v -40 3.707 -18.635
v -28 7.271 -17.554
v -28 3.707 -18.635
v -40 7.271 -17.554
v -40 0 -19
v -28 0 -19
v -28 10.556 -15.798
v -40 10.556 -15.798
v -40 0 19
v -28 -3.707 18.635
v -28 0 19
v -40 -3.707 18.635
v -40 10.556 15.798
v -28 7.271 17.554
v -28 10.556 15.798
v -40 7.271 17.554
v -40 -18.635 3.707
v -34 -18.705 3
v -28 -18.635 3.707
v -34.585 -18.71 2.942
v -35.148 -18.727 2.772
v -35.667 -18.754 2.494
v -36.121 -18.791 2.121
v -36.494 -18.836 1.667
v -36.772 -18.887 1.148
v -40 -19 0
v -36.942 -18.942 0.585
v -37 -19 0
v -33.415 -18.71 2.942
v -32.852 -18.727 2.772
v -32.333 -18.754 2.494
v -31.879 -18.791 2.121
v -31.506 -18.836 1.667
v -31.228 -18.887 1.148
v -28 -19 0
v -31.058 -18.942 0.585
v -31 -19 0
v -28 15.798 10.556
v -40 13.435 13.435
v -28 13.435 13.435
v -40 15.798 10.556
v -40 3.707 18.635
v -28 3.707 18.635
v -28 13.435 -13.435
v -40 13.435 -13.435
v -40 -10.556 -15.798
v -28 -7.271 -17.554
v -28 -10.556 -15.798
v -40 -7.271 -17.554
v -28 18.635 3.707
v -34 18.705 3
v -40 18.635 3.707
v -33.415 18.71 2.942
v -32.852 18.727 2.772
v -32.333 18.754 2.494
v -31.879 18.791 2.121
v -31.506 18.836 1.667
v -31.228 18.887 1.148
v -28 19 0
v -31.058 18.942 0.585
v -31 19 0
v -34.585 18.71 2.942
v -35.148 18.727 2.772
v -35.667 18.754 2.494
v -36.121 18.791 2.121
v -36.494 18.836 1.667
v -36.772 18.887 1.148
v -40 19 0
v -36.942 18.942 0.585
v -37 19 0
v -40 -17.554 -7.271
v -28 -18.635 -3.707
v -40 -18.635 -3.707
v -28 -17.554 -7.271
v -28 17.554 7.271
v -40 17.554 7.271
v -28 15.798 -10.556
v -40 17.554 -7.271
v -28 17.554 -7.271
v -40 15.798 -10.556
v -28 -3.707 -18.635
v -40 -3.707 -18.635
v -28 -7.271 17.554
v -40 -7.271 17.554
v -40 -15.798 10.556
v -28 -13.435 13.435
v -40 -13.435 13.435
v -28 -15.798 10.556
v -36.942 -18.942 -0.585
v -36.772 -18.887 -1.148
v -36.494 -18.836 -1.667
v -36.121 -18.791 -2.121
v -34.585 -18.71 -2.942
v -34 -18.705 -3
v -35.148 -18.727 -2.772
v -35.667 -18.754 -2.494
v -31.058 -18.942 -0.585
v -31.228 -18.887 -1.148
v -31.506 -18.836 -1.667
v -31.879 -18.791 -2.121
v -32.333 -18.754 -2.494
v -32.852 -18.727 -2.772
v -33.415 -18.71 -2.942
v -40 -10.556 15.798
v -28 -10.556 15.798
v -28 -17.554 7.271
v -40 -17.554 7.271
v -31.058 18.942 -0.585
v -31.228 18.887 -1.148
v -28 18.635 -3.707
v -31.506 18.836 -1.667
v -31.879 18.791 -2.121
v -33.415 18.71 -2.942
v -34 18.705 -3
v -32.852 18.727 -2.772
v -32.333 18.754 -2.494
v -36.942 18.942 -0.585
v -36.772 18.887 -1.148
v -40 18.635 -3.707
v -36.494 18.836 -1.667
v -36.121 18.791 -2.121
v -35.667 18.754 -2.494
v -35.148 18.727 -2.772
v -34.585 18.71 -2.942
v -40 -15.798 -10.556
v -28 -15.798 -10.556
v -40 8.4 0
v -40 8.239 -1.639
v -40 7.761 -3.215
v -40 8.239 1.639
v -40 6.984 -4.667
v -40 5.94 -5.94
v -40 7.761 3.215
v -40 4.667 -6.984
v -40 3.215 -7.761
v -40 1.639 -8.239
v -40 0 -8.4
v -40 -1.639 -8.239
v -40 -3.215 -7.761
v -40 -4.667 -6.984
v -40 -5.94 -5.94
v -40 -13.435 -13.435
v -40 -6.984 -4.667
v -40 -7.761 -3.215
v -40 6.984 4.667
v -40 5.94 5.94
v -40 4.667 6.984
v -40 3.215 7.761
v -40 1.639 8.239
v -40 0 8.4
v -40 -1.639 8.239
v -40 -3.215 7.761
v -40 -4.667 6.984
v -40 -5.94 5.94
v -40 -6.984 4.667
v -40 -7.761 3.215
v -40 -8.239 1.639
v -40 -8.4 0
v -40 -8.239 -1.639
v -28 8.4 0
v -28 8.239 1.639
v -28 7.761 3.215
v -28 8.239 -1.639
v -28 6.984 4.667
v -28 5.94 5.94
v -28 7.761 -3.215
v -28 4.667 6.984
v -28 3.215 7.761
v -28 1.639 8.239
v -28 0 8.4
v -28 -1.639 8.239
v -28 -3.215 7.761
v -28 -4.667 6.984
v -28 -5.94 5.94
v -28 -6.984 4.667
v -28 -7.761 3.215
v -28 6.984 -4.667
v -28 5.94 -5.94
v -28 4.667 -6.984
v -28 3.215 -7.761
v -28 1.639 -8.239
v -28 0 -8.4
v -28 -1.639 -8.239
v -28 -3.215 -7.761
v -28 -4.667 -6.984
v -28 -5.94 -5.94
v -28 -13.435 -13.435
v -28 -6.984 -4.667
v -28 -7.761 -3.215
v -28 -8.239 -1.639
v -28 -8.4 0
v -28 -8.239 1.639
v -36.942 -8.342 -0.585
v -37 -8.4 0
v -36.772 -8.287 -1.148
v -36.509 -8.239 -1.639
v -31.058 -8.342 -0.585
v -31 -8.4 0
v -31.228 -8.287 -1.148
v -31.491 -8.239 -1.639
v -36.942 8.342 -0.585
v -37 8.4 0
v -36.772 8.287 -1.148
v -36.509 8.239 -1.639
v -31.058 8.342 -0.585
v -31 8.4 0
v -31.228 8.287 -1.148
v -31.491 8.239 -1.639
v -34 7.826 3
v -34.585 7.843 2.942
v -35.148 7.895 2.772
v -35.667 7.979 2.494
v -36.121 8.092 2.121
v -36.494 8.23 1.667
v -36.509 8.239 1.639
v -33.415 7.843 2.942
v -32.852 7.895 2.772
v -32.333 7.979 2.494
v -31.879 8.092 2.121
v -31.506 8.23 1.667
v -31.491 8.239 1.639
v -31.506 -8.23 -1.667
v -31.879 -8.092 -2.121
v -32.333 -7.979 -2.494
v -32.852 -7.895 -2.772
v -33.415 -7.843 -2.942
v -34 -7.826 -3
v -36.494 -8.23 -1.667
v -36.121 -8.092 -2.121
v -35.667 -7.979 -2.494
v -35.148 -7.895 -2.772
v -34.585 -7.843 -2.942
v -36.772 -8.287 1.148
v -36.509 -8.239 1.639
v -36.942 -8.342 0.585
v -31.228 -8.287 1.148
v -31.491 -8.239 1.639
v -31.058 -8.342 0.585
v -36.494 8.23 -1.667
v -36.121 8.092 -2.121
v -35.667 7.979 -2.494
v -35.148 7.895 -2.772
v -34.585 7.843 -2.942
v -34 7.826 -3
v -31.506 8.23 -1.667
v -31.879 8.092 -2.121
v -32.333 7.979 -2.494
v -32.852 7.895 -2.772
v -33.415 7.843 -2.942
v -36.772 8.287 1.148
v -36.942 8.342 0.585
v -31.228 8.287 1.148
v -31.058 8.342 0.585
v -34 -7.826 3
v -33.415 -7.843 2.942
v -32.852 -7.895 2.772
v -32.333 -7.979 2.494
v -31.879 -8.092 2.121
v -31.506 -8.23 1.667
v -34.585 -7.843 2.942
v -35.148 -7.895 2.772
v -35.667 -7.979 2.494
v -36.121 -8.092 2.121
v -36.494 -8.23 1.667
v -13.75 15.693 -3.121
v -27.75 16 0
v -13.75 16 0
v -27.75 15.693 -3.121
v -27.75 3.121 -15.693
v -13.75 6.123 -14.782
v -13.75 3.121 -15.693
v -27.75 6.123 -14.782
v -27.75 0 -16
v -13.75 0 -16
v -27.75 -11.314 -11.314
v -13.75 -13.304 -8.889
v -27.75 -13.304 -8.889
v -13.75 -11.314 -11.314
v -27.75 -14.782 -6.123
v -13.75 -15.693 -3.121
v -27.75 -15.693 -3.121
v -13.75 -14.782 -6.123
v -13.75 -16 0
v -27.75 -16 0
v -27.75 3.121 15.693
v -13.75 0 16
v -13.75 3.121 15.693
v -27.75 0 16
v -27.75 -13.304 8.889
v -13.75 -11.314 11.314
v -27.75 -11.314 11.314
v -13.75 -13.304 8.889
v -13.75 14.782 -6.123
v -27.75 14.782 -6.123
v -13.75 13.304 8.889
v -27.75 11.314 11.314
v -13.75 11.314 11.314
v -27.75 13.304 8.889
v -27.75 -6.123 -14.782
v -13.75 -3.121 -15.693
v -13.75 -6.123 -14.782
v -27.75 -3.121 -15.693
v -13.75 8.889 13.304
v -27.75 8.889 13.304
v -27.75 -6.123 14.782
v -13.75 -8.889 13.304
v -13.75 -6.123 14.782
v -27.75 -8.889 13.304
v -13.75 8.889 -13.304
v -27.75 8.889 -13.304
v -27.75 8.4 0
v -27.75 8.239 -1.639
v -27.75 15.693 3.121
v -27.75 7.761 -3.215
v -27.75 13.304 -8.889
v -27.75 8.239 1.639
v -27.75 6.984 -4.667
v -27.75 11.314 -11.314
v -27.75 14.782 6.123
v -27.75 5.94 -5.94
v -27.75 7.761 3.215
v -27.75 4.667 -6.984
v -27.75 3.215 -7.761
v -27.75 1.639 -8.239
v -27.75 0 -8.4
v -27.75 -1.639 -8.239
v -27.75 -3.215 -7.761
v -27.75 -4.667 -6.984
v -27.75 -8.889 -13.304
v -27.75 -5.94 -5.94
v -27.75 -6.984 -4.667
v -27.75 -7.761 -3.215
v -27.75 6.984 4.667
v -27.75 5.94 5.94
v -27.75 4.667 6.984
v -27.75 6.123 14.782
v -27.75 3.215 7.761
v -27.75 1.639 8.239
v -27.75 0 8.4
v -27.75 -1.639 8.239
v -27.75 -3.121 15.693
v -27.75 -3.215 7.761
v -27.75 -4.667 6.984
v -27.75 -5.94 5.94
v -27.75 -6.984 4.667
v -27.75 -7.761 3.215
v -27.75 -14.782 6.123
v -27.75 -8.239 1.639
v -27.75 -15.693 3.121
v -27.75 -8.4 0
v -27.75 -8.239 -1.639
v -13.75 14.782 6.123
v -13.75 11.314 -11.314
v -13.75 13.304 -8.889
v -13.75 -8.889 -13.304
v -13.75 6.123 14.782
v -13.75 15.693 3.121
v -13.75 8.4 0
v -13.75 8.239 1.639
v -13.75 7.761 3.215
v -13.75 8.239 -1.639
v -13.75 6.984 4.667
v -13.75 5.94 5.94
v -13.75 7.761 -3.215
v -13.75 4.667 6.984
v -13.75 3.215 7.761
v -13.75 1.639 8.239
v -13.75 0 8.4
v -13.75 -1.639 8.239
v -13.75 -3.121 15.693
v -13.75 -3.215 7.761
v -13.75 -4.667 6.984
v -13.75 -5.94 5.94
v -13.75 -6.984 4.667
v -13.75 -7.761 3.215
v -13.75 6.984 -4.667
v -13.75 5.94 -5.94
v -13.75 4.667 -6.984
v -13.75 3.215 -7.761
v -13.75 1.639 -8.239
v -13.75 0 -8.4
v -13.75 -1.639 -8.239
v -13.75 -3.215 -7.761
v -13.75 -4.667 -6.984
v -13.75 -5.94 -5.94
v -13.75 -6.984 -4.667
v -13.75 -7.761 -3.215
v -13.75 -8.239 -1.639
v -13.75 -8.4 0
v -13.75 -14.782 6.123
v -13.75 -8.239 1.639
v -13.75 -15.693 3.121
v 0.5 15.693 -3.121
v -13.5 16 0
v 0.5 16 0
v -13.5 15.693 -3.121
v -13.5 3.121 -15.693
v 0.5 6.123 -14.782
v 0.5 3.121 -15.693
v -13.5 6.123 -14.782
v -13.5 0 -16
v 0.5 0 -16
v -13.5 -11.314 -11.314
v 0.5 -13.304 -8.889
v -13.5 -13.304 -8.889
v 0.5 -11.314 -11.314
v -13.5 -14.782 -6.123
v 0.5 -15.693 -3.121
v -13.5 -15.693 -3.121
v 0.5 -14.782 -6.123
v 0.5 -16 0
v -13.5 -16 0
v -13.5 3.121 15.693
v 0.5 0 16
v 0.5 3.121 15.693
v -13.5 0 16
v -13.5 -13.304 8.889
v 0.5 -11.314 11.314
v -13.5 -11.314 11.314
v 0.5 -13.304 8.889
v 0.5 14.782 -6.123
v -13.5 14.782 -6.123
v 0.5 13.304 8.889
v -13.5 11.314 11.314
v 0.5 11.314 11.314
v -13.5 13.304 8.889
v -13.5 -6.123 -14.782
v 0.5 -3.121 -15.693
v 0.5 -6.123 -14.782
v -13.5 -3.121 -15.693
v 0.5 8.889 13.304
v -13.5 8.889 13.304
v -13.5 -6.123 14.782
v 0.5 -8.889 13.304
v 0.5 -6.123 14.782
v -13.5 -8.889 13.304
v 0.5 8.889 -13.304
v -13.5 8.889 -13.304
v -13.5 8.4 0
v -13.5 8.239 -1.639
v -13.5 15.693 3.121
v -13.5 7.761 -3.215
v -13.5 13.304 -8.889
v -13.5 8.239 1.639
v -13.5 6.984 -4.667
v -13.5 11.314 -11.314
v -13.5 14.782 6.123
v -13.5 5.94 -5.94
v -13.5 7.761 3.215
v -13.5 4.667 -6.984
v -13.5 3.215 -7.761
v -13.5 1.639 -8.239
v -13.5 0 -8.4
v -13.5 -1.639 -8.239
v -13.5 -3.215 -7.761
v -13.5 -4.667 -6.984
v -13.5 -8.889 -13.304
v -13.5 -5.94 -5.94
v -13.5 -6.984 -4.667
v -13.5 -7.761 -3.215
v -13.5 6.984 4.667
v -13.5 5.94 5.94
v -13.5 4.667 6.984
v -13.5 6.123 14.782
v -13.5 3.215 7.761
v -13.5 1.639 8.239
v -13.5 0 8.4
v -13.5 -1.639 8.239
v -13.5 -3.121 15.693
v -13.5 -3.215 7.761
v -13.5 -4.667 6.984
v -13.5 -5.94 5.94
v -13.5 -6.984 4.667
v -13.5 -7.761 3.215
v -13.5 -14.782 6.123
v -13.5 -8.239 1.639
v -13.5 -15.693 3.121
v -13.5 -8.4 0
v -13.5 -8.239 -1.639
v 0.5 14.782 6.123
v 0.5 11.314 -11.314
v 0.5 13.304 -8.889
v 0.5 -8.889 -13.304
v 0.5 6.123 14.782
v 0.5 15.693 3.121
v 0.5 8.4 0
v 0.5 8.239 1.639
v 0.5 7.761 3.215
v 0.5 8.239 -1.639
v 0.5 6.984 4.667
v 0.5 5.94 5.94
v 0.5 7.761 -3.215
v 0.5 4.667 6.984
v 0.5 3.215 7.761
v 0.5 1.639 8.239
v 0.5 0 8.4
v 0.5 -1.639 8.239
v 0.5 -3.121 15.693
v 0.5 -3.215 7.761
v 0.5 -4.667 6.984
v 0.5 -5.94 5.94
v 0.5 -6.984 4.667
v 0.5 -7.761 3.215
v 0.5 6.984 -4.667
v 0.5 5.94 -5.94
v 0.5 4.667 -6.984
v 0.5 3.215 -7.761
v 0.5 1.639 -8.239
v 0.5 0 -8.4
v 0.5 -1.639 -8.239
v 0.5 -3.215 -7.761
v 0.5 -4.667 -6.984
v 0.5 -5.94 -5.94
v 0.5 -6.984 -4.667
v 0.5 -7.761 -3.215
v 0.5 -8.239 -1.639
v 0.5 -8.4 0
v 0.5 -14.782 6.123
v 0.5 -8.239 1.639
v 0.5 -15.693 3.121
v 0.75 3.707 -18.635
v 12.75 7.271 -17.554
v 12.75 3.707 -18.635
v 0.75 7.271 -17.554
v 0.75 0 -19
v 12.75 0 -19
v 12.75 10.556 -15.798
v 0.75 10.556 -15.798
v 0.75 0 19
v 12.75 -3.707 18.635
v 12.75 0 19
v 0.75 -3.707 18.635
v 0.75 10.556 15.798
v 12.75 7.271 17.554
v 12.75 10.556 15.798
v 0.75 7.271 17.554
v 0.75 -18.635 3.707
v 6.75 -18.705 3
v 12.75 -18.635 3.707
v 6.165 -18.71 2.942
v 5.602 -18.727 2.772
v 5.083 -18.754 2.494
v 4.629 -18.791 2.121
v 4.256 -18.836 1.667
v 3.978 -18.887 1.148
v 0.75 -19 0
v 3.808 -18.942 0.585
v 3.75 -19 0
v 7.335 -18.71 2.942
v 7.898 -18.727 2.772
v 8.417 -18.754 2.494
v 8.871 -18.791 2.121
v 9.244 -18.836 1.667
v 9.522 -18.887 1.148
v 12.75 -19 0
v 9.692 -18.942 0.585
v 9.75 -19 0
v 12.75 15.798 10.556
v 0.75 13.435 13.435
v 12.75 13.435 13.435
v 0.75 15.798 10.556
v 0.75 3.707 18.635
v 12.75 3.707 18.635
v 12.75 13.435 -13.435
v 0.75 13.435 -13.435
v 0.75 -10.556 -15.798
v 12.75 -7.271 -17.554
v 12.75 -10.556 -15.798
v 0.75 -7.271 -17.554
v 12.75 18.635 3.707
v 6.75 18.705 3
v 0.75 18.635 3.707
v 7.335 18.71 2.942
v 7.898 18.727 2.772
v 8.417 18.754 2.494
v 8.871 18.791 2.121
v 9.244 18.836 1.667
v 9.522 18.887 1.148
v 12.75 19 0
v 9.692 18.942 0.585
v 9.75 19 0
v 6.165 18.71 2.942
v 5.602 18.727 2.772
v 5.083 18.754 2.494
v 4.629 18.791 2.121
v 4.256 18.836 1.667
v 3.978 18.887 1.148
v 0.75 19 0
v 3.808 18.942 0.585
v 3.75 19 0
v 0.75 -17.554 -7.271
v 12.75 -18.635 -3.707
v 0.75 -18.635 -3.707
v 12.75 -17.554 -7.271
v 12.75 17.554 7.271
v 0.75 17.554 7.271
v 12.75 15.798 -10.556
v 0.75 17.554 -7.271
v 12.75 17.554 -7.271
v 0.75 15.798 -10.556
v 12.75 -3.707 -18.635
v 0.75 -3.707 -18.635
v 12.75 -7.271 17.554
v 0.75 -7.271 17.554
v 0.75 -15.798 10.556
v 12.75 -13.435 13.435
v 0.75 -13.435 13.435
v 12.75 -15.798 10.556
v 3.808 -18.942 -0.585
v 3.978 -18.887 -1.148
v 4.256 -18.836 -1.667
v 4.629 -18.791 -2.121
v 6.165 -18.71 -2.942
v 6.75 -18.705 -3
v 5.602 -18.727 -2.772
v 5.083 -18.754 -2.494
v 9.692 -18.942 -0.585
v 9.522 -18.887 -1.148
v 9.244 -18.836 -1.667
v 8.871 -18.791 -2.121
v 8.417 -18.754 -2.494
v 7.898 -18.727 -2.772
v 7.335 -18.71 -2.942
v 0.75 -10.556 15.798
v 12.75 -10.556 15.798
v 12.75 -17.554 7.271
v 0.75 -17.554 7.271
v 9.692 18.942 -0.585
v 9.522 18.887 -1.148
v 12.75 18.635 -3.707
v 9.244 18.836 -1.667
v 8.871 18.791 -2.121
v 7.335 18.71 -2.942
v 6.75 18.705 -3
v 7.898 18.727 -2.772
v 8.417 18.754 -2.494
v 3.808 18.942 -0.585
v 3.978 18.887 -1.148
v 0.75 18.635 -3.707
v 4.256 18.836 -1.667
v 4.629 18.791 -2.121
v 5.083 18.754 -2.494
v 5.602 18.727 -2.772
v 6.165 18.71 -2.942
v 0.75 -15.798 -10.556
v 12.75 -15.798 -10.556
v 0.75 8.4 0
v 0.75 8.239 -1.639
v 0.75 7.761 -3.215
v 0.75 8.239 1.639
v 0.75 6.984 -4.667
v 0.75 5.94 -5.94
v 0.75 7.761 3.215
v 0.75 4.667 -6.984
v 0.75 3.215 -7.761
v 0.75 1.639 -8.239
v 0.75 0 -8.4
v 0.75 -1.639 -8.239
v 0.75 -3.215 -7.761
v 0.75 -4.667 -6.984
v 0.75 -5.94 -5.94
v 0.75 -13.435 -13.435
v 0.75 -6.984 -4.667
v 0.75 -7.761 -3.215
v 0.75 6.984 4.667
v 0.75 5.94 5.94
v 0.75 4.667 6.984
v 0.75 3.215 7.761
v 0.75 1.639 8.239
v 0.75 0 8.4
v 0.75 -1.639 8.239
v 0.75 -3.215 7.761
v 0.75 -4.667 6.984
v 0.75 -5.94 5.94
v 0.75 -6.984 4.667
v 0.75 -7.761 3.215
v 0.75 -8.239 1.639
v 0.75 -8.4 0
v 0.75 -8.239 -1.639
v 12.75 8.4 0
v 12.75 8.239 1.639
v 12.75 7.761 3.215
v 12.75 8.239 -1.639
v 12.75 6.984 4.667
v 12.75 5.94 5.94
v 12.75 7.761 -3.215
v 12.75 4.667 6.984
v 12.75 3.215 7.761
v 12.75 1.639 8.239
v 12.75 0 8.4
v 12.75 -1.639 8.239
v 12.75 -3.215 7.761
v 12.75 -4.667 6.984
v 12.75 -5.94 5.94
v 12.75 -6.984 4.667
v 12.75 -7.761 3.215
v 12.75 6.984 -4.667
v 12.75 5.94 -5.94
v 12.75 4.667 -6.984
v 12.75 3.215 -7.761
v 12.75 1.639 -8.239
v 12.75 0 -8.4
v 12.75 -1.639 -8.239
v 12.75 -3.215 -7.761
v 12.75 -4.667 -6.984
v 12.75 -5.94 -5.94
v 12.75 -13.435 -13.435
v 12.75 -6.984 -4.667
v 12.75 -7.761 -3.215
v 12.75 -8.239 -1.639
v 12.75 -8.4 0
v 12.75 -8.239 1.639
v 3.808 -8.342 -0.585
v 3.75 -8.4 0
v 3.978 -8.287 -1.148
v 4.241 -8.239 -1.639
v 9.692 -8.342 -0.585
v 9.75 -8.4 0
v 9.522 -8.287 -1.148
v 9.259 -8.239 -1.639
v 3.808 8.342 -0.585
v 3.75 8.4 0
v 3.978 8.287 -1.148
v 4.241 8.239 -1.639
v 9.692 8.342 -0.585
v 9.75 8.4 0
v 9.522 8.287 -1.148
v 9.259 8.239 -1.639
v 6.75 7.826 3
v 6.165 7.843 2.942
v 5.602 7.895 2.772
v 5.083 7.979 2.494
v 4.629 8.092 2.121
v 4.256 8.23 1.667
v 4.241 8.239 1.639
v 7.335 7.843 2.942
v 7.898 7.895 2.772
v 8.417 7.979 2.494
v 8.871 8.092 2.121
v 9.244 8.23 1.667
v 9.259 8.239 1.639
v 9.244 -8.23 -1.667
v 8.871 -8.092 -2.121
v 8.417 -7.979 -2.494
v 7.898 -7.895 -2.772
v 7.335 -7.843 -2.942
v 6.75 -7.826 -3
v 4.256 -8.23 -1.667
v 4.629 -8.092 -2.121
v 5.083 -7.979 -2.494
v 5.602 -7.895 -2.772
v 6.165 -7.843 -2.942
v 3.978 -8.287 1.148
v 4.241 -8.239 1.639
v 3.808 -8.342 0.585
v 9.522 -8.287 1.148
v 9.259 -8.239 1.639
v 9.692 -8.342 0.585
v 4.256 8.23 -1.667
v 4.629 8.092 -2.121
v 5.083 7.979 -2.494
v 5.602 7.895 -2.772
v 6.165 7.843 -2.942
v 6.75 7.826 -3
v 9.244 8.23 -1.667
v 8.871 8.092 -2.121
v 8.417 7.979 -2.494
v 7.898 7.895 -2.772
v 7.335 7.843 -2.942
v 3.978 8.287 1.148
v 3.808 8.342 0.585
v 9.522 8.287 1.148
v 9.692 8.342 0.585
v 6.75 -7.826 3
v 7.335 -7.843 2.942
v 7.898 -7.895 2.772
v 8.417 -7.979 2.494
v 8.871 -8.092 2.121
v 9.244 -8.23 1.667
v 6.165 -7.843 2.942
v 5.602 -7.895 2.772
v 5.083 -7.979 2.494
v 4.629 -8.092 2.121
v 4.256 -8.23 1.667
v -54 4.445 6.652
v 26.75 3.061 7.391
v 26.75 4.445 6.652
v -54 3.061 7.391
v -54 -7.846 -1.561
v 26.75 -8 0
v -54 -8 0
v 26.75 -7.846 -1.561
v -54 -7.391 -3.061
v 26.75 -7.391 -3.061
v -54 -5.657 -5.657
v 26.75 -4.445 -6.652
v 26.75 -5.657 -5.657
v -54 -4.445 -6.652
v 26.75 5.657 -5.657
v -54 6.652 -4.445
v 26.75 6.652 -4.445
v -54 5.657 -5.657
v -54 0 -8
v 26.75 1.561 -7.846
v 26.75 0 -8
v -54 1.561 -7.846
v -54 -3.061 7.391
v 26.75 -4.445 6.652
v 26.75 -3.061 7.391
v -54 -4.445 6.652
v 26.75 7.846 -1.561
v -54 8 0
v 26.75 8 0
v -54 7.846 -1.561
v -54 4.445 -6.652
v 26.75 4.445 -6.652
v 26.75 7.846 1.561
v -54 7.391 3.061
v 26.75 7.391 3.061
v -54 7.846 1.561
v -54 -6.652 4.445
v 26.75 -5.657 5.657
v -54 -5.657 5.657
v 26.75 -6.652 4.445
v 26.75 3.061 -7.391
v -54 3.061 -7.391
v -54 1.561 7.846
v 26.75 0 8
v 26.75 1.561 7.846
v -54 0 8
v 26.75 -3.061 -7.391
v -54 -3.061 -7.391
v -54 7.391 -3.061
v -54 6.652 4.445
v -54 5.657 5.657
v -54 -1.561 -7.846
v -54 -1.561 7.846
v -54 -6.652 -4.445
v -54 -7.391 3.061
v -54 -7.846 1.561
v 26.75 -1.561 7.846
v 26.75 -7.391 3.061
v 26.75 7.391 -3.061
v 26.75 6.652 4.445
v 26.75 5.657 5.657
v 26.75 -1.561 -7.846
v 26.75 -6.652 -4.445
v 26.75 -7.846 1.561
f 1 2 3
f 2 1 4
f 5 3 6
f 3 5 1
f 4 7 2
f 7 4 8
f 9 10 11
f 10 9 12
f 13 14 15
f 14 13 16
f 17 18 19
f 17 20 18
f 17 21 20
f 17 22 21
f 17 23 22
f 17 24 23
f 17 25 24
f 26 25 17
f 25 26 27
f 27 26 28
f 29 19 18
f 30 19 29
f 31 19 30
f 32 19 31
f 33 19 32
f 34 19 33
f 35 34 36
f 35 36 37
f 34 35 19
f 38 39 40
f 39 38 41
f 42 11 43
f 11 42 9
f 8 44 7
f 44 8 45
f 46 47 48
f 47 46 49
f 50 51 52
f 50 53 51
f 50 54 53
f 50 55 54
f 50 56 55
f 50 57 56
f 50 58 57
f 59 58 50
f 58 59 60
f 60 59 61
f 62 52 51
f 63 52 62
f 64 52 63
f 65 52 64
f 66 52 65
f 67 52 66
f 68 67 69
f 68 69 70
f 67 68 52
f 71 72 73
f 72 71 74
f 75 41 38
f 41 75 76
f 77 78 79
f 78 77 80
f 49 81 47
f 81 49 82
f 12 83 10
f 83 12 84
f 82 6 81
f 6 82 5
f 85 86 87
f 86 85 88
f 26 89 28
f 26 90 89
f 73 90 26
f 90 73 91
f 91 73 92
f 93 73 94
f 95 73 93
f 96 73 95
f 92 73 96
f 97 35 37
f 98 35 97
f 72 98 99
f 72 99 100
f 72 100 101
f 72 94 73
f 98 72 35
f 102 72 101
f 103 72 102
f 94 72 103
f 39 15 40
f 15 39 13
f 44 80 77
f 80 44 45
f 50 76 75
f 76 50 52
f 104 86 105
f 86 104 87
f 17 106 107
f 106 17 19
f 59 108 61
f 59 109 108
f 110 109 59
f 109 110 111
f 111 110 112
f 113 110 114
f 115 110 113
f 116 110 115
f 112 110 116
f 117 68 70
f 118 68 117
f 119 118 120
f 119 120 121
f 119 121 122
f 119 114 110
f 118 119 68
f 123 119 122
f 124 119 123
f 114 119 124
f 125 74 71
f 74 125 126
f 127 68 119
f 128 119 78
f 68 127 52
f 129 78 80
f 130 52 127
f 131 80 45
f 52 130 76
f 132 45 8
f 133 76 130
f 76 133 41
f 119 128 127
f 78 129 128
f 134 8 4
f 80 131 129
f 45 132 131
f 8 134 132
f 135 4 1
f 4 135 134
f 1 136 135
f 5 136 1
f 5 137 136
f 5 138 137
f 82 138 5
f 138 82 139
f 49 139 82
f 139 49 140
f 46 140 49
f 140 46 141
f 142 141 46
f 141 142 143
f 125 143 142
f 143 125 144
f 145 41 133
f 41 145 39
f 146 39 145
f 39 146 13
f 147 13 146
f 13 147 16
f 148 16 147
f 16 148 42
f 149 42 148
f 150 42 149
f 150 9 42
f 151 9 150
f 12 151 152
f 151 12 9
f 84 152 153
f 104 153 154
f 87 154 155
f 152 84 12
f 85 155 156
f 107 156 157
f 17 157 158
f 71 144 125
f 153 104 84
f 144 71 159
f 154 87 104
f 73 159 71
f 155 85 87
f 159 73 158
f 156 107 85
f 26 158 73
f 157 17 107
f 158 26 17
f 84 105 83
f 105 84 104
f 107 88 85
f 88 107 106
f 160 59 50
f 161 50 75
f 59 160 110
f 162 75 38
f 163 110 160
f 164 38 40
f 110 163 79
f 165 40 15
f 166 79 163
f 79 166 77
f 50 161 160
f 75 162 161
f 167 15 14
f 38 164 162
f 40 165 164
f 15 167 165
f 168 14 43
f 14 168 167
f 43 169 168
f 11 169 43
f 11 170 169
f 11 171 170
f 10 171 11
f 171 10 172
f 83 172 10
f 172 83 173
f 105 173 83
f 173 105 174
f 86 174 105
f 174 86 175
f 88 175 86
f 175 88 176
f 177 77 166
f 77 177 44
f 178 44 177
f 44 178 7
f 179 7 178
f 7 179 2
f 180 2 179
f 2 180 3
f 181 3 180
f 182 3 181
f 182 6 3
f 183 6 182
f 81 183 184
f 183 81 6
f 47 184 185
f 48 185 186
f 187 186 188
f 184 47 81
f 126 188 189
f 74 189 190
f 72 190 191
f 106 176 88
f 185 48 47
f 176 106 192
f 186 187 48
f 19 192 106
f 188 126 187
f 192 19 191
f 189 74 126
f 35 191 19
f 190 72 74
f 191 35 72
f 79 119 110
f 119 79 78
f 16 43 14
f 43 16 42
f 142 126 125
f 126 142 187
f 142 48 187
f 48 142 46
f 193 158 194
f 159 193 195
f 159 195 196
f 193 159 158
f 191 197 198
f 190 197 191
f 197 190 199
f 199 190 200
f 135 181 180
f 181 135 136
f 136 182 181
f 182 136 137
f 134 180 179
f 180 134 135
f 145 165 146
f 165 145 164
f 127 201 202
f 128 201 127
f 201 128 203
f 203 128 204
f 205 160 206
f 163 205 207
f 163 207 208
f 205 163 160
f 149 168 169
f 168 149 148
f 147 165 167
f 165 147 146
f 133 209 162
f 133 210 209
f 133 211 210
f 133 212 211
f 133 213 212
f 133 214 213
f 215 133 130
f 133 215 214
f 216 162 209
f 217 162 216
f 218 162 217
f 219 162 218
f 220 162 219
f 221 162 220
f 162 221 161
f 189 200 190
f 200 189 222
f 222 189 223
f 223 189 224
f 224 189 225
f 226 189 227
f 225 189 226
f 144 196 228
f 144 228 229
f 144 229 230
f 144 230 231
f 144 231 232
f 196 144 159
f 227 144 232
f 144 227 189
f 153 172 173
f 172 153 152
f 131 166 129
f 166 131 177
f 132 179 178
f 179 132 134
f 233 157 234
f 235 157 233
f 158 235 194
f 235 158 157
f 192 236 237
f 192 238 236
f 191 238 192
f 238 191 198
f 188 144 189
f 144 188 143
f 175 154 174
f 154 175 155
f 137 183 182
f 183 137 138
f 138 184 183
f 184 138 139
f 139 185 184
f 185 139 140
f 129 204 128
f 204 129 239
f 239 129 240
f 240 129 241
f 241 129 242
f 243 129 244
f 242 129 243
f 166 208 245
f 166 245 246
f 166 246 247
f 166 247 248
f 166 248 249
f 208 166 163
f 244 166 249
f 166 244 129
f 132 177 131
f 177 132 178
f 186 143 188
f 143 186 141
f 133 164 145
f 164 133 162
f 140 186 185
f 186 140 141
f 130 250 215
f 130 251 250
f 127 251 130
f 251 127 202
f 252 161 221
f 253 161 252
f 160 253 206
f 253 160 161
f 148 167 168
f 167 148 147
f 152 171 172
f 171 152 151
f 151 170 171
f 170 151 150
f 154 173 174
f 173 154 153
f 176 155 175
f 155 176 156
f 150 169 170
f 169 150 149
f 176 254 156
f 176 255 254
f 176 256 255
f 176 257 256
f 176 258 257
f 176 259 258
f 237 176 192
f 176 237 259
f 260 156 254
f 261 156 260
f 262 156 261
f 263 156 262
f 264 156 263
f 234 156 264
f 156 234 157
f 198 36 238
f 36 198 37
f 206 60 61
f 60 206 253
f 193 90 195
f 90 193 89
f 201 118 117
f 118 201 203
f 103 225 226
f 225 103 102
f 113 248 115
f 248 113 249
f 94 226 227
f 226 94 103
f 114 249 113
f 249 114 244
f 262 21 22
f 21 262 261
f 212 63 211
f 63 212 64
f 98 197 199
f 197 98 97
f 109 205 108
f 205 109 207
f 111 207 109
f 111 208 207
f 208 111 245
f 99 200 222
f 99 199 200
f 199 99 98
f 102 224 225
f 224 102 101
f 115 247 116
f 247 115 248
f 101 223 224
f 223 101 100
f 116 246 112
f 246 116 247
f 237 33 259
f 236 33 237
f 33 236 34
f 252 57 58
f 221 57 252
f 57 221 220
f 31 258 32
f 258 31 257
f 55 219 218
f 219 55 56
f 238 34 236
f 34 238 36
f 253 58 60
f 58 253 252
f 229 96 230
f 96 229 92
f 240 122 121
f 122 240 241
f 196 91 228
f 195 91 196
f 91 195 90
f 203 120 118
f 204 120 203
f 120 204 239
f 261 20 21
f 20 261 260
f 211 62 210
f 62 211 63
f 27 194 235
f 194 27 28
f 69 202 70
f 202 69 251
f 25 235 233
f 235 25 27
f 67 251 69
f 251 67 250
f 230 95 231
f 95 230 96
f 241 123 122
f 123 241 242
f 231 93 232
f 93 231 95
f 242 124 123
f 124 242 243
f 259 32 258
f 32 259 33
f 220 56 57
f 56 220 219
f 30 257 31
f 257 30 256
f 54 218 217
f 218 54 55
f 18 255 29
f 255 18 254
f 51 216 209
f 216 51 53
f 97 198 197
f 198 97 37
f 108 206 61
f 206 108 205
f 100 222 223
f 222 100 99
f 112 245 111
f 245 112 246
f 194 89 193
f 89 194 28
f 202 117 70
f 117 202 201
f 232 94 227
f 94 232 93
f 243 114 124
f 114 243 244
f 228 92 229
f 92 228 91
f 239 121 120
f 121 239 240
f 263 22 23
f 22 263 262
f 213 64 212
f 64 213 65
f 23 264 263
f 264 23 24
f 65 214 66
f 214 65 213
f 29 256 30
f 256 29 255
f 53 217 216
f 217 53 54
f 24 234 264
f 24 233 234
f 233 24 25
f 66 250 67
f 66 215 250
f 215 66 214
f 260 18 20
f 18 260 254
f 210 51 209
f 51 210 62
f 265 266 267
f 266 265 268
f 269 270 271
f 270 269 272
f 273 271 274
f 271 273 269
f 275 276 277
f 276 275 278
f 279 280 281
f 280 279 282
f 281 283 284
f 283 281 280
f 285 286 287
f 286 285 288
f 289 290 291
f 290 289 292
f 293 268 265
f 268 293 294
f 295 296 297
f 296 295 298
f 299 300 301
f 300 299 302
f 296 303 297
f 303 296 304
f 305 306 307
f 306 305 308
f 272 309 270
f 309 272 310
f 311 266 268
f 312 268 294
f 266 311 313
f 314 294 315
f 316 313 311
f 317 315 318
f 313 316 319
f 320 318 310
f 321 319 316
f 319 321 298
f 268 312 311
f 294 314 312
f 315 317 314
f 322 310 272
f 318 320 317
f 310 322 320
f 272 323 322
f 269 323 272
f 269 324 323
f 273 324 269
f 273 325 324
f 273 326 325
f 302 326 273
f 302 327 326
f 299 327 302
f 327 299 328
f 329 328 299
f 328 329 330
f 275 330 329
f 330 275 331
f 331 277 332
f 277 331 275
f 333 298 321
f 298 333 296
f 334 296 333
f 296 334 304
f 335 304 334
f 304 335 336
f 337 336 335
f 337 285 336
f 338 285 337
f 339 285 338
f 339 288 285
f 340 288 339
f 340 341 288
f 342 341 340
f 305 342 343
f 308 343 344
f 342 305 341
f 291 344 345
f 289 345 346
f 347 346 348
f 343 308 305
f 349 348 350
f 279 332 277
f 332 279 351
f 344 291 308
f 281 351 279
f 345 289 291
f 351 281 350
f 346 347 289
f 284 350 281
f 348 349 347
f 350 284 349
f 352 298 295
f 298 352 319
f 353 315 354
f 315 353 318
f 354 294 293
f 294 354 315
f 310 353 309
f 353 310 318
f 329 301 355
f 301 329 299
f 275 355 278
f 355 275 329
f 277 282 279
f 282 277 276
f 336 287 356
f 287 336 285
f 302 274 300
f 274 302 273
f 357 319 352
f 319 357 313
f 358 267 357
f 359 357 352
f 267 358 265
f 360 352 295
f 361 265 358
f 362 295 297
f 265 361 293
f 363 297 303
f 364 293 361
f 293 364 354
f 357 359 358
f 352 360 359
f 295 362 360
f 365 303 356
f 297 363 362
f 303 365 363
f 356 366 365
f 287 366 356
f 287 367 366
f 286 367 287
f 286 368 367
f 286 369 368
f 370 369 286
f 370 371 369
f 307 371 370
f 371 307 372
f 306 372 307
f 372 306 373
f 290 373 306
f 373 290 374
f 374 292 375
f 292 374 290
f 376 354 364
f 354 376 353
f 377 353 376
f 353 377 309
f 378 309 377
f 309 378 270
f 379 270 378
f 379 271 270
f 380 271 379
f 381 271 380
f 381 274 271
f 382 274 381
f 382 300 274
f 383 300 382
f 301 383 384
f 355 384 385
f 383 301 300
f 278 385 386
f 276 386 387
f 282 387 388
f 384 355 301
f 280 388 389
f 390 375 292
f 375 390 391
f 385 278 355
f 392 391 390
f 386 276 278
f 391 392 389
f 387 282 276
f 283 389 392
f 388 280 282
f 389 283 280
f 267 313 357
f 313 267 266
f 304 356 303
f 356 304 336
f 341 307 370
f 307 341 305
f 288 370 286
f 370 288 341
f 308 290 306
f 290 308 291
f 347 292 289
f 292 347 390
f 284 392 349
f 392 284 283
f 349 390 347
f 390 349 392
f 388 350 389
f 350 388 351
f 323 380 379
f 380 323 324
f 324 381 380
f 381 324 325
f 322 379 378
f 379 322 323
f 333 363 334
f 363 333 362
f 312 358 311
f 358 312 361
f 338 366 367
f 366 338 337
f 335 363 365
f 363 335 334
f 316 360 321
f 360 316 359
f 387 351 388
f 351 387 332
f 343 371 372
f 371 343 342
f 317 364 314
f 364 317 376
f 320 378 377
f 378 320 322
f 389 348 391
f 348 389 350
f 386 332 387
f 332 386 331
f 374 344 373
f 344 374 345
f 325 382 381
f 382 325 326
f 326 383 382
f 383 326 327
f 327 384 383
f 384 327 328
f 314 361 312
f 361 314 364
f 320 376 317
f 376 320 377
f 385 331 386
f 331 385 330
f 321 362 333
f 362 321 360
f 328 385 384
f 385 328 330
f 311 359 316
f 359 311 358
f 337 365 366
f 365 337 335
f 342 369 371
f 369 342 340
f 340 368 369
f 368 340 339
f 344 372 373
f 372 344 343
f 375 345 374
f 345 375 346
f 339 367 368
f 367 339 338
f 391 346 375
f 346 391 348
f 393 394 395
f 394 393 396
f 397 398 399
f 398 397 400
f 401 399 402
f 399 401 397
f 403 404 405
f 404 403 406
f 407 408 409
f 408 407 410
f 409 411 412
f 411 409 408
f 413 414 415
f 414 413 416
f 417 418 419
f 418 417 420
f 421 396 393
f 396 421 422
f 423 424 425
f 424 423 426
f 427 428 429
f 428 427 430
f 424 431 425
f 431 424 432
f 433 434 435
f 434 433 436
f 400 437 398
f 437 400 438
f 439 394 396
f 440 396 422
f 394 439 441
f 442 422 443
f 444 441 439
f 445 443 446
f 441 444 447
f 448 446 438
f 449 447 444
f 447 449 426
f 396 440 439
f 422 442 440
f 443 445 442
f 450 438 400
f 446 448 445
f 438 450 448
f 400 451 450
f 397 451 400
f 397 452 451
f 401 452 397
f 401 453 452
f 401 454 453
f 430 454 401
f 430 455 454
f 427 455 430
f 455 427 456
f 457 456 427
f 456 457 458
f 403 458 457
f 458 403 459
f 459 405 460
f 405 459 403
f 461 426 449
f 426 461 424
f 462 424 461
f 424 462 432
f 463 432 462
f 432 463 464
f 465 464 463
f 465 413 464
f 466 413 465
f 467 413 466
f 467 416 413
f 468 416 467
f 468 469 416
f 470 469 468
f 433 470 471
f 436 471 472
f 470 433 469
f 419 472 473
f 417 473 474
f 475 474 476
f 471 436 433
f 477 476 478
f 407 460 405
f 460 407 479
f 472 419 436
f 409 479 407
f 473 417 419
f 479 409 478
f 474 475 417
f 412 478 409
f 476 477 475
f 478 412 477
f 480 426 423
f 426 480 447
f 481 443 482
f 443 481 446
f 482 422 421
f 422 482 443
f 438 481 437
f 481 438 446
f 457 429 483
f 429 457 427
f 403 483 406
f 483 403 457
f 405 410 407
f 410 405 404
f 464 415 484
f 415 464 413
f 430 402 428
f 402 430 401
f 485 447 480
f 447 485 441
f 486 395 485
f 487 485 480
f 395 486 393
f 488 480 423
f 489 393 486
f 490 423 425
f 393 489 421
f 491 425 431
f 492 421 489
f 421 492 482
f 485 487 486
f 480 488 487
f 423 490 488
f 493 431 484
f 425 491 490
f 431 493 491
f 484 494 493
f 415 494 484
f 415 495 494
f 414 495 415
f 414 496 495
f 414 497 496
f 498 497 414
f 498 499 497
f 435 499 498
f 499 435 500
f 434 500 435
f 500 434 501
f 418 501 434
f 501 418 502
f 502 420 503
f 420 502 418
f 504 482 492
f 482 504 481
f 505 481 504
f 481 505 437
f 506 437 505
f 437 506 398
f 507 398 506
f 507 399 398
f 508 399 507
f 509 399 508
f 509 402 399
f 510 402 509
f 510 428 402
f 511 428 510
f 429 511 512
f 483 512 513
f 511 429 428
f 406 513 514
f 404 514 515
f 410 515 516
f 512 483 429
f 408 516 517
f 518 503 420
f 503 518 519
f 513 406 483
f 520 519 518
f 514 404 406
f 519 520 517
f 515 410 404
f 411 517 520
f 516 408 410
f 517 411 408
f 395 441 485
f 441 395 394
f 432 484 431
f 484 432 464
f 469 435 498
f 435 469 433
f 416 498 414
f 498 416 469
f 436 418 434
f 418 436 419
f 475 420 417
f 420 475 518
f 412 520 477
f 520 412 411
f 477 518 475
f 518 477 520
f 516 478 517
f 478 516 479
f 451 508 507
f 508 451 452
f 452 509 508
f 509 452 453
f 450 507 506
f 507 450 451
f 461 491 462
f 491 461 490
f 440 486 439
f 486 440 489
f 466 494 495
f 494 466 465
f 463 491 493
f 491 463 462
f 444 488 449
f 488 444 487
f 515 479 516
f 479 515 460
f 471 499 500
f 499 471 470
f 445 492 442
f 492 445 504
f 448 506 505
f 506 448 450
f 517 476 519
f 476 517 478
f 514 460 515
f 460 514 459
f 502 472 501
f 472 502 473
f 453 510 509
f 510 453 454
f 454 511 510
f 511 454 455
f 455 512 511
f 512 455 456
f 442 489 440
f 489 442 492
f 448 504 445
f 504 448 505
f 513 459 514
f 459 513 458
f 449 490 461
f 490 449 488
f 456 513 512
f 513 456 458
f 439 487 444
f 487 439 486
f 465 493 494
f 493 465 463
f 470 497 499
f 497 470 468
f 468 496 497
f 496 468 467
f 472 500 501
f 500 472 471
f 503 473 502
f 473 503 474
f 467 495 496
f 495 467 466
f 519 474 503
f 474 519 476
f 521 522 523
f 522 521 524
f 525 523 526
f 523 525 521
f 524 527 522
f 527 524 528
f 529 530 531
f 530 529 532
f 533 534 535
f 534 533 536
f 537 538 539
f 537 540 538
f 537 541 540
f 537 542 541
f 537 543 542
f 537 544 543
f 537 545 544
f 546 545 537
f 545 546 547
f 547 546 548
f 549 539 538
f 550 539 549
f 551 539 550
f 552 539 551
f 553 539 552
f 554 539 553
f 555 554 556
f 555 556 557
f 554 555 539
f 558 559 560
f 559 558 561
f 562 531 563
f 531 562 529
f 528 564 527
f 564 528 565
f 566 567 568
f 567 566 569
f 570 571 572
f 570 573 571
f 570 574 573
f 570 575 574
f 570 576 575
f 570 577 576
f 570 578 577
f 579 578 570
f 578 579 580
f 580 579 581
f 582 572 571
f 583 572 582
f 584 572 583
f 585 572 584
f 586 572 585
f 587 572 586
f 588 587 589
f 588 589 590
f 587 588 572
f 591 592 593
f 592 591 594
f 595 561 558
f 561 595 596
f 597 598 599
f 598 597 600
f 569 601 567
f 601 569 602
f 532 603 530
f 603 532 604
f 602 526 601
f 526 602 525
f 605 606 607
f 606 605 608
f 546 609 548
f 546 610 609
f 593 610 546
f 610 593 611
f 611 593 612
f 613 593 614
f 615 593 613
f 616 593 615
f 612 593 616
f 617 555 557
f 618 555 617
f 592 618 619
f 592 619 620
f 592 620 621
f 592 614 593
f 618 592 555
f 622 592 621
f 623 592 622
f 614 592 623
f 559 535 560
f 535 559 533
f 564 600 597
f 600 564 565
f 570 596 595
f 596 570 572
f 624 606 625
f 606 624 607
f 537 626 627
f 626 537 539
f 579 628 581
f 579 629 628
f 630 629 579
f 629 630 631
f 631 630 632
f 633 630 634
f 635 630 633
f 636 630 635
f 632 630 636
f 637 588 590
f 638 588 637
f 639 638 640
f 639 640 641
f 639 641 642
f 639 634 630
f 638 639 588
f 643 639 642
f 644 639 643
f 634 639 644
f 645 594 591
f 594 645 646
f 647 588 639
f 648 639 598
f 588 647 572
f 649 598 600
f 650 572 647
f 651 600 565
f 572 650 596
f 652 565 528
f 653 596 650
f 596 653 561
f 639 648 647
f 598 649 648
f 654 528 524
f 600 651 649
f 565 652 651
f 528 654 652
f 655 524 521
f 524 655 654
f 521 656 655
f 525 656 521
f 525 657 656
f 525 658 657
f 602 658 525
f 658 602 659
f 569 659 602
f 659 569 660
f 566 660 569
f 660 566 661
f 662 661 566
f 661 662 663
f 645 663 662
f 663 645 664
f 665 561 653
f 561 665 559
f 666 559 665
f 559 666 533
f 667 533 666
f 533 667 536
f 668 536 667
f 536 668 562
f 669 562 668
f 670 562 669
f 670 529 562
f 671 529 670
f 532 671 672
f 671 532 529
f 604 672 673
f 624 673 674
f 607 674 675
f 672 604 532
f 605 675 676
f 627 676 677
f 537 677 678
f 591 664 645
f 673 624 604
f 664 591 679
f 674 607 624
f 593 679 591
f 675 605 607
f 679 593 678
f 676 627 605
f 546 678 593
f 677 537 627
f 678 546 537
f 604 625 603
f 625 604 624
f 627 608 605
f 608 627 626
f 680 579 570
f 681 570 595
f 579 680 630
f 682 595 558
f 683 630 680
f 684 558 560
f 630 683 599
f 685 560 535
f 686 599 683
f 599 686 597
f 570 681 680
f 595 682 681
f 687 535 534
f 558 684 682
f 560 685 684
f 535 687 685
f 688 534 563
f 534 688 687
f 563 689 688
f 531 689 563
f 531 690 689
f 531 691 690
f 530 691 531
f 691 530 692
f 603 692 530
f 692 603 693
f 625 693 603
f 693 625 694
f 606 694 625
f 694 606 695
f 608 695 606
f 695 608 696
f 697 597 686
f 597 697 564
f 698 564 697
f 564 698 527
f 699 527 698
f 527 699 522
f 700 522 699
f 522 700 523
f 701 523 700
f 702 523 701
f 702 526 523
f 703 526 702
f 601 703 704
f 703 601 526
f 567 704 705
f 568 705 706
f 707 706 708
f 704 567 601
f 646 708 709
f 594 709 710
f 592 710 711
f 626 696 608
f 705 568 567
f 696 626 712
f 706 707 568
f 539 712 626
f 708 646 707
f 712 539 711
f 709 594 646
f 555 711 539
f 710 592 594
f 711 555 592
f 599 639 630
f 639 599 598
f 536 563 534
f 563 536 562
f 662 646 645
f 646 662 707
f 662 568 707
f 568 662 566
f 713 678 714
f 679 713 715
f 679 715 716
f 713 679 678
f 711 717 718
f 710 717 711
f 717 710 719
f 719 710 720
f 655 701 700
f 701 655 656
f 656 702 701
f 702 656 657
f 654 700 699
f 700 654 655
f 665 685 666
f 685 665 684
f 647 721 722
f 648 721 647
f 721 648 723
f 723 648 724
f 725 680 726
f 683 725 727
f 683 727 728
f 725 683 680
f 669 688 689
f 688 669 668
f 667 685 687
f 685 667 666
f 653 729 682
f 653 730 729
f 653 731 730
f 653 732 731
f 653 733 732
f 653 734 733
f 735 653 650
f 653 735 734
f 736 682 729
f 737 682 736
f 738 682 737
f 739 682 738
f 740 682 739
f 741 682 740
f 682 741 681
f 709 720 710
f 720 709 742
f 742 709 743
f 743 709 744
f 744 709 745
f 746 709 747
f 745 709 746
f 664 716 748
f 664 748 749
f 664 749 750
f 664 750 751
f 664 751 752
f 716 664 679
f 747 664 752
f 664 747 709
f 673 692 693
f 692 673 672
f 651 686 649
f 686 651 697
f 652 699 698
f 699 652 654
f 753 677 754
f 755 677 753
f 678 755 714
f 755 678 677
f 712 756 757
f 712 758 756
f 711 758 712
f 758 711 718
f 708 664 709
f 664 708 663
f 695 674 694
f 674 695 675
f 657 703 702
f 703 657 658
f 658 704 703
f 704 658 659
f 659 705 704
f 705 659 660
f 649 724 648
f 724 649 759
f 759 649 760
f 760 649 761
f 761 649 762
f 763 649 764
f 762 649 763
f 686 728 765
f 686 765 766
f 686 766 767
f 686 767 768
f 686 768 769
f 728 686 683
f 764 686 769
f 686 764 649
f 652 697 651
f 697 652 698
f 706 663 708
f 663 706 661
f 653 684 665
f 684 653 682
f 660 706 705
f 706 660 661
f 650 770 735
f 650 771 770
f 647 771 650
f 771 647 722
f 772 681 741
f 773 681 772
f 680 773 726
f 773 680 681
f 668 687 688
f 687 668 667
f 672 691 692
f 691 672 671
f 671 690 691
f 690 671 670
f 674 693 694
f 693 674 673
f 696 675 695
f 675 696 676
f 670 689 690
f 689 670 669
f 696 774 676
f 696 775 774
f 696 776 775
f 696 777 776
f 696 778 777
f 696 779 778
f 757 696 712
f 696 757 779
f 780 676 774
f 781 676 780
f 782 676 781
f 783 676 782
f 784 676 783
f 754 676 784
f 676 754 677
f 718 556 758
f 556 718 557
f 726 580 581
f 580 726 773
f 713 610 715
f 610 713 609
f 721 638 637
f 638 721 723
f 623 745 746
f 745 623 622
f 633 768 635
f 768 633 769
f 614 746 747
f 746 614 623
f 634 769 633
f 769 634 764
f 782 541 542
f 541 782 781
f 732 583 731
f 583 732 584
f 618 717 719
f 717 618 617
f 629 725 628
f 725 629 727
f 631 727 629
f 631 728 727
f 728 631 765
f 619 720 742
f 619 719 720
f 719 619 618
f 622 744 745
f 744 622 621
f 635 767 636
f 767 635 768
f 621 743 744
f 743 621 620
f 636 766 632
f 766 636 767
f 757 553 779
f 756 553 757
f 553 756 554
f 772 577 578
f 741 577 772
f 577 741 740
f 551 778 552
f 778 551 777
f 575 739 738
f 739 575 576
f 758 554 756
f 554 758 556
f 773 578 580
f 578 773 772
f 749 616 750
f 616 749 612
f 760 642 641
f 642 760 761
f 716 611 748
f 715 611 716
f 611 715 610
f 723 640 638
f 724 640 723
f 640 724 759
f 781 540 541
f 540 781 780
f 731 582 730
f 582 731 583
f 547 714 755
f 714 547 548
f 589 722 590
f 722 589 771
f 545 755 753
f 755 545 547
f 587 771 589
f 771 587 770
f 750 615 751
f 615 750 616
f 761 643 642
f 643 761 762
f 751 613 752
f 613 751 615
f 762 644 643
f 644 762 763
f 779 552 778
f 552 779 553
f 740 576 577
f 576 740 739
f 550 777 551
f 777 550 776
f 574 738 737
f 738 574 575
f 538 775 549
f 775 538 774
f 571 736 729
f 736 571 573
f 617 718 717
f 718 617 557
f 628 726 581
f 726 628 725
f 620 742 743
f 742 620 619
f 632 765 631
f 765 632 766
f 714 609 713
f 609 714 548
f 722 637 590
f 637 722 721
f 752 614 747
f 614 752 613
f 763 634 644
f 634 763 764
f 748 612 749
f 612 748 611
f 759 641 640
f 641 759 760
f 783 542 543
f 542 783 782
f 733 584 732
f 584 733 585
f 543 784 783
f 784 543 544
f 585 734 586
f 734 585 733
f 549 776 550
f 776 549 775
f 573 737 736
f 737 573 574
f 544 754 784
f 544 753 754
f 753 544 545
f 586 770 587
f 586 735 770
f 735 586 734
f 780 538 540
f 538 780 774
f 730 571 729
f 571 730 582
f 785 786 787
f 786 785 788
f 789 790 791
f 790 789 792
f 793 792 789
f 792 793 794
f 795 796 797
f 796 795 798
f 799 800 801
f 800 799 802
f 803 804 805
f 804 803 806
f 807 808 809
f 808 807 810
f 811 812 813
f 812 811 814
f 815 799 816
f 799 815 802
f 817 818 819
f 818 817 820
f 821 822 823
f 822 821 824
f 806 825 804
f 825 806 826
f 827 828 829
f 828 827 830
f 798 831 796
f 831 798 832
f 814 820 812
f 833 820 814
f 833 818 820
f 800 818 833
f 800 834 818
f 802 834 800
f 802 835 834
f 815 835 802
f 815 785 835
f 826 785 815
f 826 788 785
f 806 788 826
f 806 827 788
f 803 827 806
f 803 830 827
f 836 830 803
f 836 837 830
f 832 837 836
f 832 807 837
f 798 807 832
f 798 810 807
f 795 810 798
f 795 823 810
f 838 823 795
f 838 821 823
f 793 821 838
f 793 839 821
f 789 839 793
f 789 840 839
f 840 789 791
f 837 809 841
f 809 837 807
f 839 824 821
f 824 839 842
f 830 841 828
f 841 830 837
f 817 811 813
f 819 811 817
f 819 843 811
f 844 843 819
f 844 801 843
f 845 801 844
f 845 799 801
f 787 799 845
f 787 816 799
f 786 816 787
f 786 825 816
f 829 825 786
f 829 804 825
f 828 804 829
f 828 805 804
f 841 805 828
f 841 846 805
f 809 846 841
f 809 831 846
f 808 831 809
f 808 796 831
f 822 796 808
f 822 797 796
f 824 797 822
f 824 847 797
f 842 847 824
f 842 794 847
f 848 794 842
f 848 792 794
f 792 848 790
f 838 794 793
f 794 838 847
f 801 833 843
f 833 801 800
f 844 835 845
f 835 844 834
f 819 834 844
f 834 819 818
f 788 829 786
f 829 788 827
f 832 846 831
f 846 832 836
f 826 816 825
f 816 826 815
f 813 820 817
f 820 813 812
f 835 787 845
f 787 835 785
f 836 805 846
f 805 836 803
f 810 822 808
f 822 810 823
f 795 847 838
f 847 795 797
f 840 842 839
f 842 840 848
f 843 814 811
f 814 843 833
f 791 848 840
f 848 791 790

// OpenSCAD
$fn = 32;

// ------------------------------------------------------------------------
// Shaft with rings and collars: d16 shaft, 4 rings
// Every part is its own module, assembly() places them once.
// ------------------------------------------------------------------------

// --- part 1 ---
module shaft() {
  translate([0, 0, -40.375]) cylinder(h = 80.75, d = 16);
}

// --- part 2 ---
module collar_a() {
  difference() {
    cylinder(h = 12, d = 38);
    translate([0, 0, -1]) cylinder(h = 14, d = 16.8);
    translate([0, 0, 6]) rotate([90, 0, 0]) cylinder(h = 40, d = 6, center = true);
  }
}

// --- part 3 ---
module spacer_a() {
  difference() {
      translate([0, 0, 0]) cylinder(h = 14, d = 32);
      translate([0, 0, -1]) cylinder(h = 16, d = 16.8);
    }
}

// --- part 4 ---
module spacer_b() {
  difference() {
      translate([0, 0, 0]) cylinder(h = 14, d = 32);
      translate([0, 0, -1]) cylinder(h = 16, d = 16.8);
    }
}

// --- part 5 ---
module collar_b() {
  difference() {
    cylinder(h = 12, d = 38);
    translate([0, 0, -1]) cylinder(h = 14, d = 16.8);
    translate([0, 0, 6]) rotate([90, 0, 0]) cylinder(h = 40, d = 6, center = true);
  }
}

// --- assembly ---
module assembly() {
  translate([-13.625, 0, 0]) rotate([0, 90, 0]) shaft();
  translate([-40, 0, 0]) rotate([0, 90, 0]) collar_a();
  translate([-27.75, 0, 0]) rotate([0, 90, 0]) spacer_a();
  translate([-13.5, 0, 0]) rotate([0, 90, 0]) spacer_b();
  translate([0.75, 0, 0]) rotate([0, 90, 0]) collar_b();
}

assembly();
